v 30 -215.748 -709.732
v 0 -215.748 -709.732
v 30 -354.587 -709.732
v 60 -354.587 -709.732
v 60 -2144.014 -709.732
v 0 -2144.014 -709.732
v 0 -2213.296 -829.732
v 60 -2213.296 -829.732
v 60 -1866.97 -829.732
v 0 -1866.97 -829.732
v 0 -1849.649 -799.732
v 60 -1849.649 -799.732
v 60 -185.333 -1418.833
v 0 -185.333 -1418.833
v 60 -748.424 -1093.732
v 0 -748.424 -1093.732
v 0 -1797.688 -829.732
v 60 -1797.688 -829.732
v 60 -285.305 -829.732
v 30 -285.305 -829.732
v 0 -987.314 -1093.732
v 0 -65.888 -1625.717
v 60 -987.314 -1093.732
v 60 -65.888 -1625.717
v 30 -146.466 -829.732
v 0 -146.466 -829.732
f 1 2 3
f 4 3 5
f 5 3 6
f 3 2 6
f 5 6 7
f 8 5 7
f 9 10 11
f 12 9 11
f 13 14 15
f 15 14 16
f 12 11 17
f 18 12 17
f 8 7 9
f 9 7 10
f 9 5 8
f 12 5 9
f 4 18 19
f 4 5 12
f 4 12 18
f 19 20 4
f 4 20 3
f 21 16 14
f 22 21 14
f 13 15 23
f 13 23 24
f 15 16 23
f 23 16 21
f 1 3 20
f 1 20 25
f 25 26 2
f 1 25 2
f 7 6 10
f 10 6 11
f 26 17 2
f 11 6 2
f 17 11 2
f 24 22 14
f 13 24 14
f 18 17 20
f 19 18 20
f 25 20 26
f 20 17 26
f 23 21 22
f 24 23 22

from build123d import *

# Parameters (mm, degrees)
F1_DEPTH = 60
F2_DEPTH = 30
F5_DEPTH = 60


with BuildPart() as f1:
    # F0 (on Right) → F1 (new body)
    with BuildSketch(Plane.YZ):
        Polygon((-2144.0138730987, -709.7315810384), (-2213.2959054015, -829.7315810384), (-1866.9698524821, -829.7315810384), (-1849.6493444064, -799.7315810384), (-1797.6878201794, -829.7315810384), (-285.3045596479, -829.7315810384), (-354.5865919507, -709.7315810384), align=None)
    extrude(amount=F1_DEPTH)

    # F0 (on Right) → F2 (join)
    with BuildSketch(Plane.YZ):
        Polygon((-215.7480825998, -709.7315810384), (-354.5865919507, -709.7315810384), (-285.3045596479, -829.7315810384), (-146.466050297, -829.7315810384), align=None)
    extrude(amount=F2_DEPTH)


with BuildPart() as f5:
    # F3 (on Right) → F5 (new body)
    with BuildSketch(Plane.YZ):
        Polygon((-185.3331125225, -1418.8327086396), (-466.878688753, -1256.2822944138), (-748.4242649835, -1093.731880188), (-987.3136878014, -1093.731880188), (-526.6010444575, -1359.7244488417), (-65.8884011135, -1625.7170174953), align=None)
    extrude(amount=F5_DEPTH)


solid = Compound([f1.part, f5.part])
